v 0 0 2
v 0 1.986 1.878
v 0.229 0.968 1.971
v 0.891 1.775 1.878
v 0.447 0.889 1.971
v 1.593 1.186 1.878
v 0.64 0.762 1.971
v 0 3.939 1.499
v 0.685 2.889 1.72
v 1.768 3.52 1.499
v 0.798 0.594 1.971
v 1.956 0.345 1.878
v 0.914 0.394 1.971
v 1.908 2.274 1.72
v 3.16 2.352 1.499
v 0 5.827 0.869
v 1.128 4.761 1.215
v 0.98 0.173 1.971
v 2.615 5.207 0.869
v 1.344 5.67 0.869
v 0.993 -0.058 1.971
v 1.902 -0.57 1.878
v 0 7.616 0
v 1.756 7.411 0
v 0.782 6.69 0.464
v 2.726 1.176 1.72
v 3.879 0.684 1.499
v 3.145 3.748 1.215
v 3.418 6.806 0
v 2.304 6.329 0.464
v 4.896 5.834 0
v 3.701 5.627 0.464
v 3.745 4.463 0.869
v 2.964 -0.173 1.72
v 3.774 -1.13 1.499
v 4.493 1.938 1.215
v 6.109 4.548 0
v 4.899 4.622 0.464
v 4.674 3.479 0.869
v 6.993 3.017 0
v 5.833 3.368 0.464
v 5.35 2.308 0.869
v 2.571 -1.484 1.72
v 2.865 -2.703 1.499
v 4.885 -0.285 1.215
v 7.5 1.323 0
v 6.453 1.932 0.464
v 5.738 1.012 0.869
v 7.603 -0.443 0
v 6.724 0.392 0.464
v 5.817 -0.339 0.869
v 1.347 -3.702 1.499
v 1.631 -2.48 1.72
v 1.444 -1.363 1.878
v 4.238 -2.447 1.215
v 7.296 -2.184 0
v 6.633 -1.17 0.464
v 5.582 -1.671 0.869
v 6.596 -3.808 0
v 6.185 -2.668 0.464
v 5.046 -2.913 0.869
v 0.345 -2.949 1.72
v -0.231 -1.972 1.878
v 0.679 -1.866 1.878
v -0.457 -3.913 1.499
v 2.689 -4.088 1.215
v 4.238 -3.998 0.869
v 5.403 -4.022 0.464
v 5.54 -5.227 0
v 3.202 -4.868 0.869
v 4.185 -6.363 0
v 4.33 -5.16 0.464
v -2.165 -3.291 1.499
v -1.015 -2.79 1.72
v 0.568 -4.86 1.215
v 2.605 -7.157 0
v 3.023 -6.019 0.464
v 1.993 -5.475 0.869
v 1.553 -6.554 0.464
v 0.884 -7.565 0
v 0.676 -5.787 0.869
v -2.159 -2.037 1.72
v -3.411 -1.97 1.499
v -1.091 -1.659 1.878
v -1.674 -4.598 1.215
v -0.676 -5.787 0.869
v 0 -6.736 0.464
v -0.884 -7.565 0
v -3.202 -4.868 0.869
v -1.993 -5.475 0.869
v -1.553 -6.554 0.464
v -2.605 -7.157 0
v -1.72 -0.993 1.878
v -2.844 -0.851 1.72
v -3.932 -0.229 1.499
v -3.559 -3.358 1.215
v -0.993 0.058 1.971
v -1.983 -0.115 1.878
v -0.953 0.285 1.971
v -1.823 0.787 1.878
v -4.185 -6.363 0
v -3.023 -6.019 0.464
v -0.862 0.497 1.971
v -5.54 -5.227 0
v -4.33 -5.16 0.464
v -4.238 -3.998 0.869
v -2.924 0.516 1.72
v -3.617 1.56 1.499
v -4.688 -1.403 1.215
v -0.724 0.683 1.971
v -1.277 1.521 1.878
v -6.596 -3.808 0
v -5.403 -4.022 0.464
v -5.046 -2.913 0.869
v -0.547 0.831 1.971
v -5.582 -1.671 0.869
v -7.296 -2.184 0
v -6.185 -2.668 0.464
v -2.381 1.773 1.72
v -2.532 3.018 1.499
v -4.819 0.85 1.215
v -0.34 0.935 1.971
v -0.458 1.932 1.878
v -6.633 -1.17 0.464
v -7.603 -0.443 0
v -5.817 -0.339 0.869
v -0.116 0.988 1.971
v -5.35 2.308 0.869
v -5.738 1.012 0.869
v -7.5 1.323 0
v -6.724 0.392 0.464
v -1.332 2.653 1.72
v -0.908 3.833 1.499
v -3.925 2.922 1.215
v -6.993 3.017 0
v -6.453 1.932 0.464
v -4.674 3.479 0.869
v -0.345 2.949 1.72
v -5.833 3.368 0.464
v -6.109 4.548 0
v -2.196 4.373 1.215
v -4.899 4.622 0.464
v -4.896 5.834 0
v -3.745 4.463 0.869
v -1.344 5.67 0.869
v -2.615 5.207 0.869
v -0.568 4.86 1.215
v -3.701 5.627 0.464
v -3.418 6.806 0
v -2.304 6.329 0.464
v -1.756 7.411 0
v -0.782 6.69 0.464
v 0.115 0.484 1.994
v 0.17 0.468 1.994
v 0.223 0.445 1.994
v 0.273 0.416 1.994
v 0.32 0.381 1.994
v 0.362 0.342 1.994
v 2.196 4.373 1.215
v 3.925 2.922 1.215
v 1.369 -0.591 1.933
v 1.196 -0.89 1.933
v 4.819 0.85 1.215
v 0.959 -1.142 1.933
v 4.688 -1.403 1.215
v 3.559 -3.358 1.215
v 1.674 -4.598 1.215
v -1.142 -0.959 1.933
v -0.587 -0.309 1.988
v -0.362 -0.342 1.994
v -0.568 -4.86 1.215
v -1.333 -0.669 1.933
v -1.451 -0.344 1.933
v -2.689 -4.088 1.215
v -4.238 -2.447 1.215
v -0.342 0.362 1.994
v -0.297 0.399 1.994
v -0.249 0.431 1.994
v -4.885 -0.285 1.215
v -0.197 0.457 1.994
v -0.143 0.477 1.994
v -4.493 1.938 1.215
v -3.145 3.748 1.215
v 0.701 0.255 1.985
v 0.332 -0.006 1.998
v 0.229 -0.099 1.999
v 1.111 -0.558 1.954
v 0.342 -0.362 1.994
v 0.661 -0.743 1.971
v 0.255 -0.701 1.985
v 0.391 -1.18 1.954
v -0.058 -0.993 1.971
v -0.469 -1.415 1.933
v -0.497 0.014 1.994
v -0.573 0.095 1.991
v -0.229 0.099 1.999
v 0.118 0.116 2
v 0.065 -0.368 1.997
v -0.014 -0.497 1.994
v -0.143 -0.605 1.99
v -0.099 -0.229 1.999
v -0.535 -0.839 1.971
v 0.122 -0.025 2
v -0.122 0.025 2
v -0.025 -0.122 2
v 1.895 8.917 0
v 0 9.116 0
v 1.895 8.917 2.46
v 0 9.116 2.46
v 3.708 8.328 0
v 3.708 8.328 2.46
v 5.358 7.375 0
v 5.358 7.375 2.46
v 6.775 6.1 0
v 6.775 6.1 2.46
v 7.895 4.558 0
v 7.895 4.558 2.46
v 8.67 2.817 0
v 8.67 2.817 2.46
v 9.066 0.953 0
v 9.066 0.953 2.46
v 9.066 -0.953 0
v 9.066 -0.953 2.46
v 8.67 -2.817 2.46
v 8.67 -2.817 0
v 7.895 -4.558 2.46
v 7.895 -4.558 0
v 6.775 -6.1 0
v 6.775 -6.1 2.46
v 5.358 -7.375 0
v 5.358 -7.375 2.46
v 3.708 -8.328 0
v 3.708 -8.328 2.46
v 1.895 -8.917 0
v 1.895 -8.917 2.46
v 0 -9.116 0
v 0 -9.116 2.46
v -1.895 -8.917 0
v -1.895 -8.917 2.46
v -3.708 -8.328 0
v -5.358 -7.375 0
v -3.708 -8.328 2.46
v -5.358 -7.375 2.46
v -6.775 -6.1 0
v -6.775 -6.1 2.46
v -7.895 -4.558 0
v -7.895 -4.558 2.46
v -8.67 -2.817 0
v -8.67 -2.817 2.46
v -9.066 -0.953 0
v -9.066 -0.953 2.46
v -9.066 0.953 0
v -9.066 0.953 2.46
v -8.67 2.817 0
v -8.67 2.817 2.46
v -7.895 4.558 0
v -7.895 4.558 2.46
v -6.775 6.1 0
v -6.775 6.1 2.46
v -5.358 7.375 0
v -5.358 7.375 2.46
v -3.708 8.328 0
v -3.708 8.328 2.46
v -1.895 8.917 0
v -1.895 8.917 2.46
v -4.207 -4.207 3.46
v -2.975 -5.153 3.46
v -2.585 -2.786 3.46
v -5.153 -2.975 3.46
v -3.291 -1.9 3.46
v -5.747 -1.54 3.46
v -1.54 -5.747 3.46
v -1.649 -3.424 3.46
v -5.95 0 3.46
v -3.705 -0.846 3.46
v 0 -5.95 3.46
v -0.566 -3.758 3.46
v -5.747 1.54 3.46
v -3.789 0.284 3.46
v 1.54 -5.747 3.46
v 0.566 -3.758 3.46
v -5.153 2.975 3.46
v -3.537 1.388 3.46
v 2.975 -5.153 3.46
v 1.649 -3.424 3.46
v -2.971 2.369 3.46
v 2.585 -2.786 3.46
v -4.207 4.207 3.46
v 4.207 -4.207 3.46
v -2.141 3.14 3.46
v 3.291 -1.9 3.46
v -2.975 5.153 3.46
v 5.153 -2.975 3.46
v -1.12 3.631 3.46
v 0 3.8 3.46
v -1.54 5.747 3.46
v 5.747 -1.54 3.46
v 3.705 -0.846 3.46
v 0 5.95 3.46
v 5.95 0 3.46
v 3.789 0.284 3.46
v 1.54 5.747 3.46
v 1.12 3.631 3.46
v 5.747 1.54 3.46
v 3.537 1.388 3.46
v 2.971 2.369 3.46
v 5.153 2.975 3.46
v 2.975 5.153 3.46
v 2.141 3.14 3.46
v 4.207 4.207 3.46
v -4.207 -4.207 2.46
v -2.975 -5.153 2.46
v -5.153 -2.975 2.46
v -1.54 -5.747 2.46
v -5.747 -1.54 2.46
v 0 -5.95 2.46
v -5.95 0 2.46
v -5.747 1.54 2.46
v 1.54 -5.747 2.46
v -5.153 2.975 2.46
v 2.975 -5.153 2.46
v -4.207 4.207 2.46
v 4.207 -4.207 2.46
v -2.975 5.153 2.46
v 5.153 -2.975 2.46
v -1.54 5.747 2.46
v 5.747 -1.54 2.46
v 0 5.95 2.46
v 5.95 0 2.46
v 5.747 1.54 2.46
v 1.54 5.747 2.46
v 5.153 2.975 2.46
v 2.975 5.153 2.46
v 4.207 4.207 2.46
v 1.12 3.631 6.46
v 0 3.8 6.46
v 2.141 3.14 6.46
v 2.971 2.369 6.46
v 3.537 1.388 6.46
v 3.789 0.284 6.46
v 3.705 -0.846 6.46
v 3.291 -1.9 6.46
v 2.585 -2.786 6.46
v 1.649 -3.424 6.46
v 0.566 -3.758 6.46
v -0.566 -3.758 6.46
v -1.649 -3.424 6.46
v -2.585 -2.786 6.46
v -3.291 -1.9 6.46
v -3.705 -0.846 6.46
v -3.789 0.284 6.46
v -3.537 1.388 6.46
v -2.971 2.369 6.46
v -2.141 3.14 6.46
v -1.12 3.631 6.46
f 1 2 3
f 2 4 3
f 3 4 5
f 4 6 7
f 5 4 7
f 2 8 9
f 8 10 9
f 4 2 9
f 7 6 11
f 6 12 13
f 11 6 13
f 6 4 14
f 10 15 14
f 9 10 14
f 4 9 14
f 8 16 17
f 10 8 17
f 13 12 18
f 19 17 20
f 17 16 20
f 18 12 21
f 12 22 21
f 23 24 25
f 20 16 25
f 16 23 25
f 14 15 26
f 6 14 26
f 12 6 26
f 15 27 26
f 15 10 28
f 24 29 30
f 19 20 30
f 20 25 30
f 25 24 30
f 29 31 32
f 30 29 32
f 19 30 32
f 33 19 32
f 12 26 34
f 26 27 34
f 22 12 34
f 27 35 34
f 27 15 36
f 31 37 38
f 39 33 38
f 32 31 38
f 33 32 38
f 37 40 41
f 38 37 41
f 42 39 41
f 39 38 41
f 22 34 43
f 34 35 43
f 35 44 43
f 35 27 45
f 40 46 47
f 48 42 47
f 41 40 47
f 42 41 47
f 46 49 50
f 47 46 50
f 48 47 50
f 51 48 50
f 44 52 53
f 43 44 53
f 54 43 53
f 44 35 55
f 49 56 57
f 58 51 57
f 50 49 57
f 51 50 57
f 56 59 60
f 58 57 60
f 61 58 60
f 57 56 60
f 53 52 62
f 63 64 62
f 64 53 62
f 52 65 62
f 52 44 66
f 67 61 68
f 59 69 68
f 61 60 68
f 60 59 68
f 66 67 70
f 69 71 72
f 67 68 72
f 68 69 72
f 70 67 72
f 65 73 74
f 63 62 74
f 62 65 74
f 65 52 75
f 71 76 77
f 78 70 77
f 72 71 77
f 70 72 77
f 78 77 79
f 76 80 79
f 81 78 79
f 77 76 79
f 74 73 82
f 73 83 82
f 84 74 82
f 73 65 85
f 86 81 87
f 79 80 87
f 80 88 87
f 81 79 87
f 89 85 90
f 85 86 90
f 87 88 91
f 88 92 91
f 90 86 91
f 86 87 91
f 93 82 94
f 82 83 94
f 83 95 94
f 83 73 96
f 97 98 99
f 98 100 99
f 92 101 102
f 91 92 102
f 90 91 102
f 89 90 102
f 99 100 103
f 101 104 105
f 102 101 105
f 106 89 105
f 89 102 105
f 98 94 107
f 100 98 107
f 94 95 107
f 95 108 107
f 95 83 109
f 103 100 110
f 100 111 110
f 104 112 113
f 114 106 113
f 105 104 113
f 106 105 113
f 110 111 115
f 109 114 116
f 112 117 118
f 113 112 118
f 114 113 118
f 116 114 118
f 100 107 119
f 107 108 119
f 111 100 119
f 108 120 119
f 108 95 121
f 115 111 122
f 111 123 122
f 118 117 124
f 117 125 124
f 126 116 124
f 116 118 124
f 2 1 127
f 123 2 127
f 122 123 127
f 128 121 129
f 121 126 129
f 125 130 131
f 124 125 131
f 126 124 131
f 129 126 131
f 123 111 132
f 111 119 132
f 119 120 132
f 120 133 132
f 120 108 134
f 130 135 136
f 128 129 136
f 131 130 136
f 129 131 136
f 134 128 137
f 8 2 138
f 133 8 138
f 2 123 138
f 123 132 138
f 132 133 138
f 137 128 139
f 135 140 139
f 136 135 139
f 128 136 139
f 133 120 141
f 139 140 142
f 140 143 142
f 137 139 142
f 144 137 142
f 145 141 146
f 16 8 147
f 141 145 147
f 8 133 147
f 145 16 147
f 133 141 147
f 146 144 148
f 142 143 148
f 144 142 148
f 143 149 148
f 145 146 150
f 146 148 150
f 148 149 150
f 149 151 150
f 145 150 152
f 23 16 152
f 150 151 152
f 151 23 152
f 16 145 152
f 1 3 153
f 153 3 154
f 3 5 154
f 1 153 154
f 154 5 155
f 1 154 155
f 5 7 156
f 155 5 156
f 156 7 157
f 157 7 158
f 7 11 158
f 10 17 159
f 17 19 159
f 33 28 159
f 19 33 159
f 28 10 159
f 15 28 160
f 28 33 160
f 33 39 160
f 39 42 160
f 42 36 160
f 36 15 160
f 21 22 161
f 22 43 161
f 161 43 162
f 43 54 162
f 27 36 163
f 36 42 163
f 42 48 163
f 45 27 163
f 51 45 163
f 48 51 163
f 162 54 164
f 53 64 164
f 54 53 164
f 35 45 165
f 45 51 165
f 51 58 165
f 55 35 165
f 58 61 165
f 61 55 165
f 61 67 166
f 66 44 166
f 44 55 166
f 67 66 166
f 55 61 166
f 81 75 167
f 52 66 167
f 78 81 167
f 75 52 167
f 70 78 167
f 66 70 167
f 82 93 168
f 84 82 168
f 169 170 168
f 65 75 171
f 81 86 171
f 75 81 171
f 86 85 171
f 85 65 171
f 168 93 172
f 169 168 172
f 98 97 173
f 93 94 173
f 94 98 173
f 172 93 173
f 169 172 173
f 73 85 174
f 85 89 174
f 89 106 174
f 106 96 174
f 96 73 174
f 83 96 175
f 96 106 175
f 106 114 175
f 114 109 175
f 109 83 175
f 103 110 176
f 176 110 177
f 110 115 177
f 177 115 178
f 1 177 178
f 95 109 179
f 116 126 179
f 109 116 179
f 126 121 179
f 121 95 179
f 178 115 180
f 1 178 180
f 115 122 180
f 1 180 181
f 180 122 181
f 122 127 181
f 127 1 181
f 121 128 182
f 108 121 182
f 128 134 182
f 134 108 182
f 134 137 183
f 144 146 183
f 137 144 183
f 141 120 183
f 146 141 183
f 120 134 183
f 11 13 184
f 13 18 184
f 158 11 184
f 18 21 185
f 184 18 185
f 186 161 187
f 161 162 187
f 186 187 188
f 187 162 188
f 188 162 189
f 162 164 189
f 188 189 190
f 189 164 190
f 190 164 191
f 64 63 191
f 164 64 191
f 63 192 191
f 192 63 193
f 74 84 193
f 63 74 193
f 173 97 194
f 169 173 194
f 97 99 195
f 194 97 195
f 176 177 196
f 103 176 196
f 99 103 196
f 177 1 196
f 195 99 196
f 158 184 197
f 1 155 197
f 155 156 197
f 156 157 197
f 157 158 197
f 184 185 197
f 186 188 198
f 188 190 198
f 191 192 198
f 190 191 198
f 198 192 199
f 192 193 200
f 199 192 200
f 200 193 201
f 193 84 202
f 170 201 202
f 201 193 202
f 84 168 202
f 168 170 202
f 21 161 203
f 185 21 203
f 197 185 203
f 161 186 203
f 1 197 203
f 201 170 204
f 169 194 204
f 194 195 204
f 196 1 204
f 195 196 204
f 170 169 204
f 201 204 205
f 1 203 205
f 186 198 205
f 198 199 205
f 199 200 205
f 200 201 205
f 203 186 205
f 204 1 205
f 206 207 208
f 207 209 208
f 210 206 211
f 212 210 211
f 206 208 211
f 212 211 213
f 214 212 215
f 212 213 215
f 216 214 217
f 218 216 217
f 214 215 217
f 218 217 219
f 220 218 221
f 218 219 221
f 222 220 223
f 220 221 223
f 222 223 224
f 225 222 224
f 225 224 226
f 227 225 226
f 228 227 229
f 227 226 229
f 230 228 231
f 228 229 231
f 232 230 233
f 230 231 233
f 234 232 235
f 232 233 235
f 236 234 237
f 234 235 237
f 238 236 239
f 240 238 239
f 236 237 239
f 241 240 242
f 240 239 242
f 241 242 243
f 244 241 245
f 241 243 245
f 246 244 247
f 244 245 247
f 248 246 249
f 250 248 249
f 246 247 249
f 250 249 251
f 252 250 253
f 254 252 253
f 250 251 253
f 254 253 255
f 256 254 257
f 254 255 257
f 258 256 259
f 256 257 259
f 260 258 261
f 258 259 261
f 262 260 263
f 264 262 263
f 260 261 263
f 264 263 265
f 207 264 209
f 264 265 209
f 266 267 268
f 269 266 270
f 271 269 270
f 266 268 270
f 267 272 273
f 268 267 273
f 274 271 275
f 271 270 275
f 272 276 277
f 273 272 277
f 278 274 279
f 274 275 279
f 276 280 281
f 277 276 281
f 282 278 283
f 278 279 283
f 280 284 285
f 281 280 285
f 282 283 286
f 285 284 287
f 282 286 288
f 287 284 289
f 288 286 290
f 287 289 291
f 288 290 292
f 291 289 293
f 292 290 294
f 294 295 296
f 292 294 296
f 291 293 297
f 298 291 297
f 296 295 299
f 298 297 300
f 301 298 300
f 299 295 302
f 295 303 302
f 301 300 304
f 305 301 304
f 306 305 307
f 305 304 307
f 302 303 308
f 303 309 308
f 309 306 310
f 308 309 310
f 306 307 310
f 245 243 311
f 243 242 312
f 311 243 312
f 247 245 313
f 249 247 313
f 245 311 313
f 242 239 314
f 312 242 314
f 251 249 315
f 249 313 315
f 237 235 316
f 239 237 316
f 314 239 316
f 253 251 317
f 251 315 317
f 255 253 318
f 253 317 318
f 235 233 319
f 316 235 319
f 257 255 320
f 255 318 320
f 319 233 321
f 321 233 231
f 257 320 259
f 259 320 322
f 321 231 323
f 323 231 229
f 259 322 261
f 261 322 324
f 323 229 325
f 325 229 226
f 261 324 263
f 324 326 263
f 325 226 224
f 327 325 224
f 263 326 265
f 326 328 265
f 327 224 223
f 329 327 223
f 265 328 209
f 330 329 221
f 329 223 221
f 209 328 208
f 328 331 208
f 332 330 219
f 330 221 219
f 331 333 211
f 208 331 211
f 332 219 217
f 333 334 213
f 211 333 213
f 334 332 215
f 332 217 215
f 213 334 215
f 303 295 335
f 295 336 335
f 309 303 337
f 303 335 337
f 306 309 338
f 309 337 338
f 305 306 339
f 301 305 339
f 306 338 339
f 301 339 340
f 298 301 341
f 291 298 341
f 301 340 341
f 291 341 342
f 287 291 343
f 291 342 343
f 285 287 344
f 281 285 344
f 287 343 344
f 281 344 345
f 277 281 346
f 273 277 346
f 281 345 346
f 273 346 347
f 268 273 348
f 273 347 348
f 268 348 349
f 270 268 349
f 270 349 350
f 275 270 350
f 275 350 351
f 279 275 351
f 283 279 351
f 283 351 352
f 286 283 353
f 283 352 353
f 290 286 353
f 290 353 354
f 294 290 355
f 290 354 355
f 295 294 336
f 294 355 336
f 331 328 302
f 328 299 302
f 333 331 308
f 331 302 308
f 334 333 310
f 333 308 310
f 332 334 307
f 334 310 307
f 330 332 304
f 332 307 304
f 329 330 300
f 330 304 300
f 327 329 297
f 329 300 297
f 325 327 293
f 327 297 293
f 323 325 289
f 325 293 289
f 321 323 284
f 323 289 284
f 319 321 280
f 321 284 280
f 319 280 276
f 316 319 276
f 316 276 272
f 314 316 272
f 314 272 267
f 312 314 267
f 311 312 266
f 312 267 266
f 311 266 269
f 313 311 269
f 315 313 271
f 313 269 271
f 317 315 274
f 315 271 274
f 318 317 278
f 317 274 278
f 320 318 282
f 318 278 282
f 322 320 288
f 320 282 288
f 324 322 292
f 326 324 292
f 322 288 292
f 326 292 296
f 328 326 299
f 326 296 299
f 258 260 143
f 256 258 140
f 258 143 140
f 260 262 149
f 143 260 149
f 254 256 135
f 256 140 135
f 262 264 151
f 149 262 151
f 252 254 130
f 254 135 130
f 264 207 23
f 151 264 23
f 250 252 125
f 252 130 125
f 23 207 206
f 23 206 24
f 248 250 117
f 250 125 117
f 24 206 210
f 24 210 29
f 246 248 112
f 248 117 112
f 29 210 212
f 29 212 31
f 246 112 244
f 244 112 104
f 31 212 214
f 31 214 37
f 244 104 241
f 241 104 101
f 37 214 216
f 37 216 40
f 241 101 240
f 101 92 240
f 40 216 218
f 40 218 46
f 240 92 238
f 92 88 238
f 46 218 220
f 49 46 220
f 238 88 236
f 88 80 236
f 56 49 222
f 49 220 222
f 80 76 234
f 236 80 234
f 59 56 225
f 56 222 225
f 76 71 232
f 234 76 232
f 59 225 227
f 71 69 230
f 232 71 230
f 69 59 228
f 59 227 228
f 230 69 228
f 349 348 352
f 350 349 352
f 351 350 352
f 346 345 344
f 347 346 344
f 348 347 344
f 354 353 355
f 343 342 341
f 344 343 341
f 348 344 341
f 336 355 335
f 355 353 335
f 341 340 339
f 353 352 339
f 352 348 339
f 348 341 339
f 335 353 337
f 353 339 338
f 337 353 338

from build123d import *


with BuildPart() as f1:
    # F0 (on Right) → F1 (revolve)
    with BuildSketch(Plane.YZ):
        with BuildLine():
            ThreePointArc((0, 2), (3.939137, 1.499026), (7.616186, 0))
            Line((7.616186, 0), (9.116186, 0))
            Line((9.116186, 0), (9.116186, 2.46))
            Line((9.116186, 2.46), (5.95, 2.46))
            Line((5.95, 2.46), (5.95, 3.46))
            Line((5.95, 3.46), (3.8, 3.46))
            Line((3.8, 3.46), (3.8, 6.46))
            Line((3.8, 6.46), (0, 6.46))
            Line((0, 6.46), (0, 2))
        make_face()
    revolve(axis=Axis((0, 0, 3.23), (0, 0, -1)))


solid = f1.part
